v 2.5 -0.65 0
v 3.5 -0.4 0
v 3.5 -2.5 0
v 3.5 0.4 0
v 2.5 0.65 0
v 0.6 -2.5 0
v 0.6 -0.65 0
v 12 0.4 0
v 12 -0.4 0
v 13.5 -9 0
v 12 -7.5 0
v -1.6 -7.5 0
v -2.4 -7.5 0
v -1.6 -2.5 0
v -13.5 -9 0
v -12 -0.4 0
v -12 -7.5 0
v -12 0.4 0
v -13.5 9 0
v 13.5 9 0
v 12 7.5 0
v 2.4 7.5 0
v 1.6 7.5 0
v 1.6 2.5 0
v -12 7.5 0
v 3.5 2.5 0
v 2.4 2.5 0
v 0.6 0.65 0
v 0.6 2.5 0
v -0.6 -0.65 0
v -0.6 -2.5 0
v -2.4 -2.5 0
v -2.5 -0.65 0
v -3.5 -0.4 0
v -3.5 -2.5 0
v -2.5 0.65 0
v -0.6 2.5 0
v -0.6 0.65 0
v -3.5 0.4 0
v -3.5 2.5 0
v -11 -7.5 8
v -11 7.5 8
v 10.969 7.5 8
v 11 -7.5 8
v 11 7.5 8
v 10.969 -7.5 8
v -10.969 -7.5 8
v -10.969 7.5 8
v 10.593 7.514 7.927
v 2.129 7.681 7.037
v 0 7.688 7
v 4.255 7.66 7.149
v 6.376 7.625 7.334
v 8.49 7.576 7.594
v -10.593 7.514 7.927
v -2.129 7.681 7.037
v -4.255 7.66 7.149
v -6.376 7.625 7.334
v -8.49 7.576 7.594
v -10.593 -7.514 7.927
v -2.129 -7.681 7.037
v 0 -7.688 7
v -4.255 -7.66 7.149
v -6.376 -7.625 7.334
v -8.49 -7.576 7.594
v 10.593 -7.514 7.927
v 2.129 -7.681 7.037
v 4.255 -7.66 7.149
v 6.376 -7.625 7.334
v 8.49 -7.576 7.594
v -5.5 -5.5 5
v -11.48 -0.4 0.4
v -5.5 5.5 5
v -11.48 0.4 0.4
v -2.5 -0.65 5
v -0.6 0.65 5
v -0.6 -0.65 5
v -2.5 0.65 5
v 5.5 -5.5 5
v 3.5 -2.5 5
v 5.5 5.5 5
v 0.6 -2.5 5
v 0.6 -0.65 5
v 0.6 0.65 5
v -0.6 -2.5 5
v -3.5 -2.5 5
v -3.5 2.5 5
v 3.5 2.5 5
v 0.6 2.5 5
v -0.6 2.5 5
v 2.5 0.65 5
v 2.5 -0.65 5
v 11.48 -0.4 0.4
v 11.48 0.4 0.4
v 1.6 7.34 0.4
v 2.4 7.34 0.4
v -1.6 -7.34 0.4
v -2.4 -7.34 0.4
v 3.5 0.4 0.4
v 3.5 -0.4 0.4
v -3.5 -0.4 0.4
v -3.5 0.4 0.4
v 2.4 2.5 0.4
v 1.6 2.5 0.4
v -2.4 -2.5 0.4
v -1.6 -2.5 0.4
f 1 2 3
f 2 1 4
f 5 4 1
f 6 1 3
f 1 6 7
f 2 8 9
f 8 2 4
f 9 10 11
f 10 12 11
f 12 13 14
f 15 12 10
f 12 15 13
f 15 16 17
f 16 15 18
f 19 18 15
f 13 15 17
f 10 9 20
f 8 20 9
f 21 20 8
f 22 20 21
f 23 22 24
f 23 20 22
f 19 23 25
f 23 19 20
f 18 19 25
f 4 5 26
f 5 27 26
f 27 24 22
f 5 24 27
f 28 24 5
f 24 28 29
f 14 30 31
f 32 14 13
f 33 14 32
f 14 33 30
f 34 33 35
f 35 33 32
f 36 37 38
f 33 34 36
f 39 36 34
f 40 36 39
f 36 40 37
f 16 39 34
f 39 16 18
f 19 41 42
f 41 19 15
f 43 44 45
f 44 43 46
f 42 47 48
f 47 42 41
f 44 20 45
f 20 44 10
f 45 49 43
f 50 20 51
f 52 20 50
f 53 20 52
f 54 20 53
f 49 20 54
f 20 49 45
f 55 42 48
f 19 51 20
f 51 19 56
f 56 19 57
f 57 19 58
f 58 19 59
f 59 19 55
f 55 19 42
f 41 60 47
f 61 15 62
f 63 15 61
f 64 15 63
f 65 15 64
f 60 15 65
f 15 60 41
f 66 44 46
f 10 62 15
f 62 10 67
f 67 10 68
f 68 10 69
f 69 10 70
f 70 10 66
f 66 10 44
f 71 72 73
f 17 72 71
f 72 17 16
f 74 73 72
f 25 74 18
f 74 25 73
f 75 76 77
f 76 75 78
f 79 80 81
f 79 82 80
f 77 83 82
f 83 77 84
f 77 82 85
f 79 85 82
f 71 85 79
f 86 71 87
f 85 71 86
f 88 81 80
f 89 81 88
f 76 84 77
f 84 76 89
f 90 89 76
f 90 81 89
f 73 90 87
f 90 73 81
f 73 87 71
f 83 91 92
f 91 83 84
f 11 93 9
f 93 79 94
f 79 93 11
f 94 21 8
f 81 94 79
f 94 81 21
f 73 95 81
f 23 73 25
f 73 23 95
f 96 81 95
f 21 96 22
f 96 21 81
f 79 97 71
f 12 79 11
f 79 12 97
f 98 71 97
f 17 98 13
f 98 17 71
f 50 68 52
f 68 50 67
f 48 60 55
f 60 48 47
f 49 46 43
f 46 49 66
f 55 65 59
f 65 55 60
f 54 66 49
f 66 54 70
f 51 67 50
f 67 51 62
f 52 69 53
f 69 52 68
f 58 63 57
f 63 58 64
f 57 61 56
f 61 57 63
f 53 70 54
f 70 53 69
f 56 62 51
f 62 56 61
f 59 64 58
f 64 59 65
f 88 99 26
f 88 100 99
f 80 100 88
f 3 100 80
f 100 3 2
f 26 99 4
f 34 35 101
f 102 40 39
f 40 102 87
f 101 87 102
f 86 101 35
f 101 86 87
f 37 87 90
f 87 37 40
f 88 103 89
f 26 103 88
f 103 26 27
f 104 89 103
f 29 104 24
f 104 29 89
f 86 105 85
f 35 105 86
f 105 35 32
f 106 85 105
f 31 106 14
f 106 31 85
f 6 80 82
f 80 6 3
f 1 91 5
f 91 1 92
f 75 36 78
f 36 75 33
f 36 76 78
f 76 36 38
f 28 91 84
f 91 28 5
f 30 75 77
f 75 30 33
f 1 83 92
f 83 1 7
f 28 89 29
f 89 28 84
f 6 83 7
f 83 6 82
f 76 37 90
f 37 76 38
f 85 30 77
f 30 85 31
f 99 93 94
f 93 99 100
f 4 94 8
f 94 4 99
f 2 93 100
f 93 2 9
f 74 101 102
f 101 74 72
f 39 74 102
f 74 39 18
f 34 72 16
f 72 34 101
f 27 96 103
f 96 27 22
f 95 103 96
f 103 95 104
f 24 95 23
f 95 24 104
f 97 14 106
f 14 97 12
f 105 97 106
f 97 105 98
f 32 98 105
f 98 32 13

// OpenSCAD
key_height = 8;

bottom_x_size = 27;
bottom_y_size = 18;

top_x_size = 22;
top_y_size = 15;

union() {
  difference() {
    linear_extrude(height = key_height, scale = [top_x_size / bottom_x_size, top_y_size / bottom_y_size]) {
      square(size=[bottom_x_size, bottom_y_size], center=true);
    }
    linear_extrude(height = 5, scale = [11/(bottom_x_size-3), 11/(bottom_y_size-3)]) {
      square(size=[bottom_x_size-3, bottom_y_size-3], center=true);
    }
    rotate([90, 0, 0]) {
      translate([0, 60 + key_height, 0]) {
        cylinder(r=61, h = top_y_size + 2, center = true, $fn=180);
      }
    }
  }
  translate([0, 0, 3]) {
    difference() {
      cube([7, 5, 6], center=true);
      cube([5, 1.3, 12], center=true);
      cube([1.2, 6, 12], center=true);
    }
  }
  translate([8, 0, 0.2]) cube([(27-6)/2, 0.8, 0.4], center=true);
  translate([-8, 0, 0.2]) cube([(27-6)/2, 0.8, 0.4], center=true);
  translate([2, (18-7)/2, 0.2]) cube([0.8, (18-5)/2, 0.4], center=true);
  translate([-2, -(18-7)/2, 0.2]) cube([0.8, (18-5)/2, 0.4], center=true);
}
